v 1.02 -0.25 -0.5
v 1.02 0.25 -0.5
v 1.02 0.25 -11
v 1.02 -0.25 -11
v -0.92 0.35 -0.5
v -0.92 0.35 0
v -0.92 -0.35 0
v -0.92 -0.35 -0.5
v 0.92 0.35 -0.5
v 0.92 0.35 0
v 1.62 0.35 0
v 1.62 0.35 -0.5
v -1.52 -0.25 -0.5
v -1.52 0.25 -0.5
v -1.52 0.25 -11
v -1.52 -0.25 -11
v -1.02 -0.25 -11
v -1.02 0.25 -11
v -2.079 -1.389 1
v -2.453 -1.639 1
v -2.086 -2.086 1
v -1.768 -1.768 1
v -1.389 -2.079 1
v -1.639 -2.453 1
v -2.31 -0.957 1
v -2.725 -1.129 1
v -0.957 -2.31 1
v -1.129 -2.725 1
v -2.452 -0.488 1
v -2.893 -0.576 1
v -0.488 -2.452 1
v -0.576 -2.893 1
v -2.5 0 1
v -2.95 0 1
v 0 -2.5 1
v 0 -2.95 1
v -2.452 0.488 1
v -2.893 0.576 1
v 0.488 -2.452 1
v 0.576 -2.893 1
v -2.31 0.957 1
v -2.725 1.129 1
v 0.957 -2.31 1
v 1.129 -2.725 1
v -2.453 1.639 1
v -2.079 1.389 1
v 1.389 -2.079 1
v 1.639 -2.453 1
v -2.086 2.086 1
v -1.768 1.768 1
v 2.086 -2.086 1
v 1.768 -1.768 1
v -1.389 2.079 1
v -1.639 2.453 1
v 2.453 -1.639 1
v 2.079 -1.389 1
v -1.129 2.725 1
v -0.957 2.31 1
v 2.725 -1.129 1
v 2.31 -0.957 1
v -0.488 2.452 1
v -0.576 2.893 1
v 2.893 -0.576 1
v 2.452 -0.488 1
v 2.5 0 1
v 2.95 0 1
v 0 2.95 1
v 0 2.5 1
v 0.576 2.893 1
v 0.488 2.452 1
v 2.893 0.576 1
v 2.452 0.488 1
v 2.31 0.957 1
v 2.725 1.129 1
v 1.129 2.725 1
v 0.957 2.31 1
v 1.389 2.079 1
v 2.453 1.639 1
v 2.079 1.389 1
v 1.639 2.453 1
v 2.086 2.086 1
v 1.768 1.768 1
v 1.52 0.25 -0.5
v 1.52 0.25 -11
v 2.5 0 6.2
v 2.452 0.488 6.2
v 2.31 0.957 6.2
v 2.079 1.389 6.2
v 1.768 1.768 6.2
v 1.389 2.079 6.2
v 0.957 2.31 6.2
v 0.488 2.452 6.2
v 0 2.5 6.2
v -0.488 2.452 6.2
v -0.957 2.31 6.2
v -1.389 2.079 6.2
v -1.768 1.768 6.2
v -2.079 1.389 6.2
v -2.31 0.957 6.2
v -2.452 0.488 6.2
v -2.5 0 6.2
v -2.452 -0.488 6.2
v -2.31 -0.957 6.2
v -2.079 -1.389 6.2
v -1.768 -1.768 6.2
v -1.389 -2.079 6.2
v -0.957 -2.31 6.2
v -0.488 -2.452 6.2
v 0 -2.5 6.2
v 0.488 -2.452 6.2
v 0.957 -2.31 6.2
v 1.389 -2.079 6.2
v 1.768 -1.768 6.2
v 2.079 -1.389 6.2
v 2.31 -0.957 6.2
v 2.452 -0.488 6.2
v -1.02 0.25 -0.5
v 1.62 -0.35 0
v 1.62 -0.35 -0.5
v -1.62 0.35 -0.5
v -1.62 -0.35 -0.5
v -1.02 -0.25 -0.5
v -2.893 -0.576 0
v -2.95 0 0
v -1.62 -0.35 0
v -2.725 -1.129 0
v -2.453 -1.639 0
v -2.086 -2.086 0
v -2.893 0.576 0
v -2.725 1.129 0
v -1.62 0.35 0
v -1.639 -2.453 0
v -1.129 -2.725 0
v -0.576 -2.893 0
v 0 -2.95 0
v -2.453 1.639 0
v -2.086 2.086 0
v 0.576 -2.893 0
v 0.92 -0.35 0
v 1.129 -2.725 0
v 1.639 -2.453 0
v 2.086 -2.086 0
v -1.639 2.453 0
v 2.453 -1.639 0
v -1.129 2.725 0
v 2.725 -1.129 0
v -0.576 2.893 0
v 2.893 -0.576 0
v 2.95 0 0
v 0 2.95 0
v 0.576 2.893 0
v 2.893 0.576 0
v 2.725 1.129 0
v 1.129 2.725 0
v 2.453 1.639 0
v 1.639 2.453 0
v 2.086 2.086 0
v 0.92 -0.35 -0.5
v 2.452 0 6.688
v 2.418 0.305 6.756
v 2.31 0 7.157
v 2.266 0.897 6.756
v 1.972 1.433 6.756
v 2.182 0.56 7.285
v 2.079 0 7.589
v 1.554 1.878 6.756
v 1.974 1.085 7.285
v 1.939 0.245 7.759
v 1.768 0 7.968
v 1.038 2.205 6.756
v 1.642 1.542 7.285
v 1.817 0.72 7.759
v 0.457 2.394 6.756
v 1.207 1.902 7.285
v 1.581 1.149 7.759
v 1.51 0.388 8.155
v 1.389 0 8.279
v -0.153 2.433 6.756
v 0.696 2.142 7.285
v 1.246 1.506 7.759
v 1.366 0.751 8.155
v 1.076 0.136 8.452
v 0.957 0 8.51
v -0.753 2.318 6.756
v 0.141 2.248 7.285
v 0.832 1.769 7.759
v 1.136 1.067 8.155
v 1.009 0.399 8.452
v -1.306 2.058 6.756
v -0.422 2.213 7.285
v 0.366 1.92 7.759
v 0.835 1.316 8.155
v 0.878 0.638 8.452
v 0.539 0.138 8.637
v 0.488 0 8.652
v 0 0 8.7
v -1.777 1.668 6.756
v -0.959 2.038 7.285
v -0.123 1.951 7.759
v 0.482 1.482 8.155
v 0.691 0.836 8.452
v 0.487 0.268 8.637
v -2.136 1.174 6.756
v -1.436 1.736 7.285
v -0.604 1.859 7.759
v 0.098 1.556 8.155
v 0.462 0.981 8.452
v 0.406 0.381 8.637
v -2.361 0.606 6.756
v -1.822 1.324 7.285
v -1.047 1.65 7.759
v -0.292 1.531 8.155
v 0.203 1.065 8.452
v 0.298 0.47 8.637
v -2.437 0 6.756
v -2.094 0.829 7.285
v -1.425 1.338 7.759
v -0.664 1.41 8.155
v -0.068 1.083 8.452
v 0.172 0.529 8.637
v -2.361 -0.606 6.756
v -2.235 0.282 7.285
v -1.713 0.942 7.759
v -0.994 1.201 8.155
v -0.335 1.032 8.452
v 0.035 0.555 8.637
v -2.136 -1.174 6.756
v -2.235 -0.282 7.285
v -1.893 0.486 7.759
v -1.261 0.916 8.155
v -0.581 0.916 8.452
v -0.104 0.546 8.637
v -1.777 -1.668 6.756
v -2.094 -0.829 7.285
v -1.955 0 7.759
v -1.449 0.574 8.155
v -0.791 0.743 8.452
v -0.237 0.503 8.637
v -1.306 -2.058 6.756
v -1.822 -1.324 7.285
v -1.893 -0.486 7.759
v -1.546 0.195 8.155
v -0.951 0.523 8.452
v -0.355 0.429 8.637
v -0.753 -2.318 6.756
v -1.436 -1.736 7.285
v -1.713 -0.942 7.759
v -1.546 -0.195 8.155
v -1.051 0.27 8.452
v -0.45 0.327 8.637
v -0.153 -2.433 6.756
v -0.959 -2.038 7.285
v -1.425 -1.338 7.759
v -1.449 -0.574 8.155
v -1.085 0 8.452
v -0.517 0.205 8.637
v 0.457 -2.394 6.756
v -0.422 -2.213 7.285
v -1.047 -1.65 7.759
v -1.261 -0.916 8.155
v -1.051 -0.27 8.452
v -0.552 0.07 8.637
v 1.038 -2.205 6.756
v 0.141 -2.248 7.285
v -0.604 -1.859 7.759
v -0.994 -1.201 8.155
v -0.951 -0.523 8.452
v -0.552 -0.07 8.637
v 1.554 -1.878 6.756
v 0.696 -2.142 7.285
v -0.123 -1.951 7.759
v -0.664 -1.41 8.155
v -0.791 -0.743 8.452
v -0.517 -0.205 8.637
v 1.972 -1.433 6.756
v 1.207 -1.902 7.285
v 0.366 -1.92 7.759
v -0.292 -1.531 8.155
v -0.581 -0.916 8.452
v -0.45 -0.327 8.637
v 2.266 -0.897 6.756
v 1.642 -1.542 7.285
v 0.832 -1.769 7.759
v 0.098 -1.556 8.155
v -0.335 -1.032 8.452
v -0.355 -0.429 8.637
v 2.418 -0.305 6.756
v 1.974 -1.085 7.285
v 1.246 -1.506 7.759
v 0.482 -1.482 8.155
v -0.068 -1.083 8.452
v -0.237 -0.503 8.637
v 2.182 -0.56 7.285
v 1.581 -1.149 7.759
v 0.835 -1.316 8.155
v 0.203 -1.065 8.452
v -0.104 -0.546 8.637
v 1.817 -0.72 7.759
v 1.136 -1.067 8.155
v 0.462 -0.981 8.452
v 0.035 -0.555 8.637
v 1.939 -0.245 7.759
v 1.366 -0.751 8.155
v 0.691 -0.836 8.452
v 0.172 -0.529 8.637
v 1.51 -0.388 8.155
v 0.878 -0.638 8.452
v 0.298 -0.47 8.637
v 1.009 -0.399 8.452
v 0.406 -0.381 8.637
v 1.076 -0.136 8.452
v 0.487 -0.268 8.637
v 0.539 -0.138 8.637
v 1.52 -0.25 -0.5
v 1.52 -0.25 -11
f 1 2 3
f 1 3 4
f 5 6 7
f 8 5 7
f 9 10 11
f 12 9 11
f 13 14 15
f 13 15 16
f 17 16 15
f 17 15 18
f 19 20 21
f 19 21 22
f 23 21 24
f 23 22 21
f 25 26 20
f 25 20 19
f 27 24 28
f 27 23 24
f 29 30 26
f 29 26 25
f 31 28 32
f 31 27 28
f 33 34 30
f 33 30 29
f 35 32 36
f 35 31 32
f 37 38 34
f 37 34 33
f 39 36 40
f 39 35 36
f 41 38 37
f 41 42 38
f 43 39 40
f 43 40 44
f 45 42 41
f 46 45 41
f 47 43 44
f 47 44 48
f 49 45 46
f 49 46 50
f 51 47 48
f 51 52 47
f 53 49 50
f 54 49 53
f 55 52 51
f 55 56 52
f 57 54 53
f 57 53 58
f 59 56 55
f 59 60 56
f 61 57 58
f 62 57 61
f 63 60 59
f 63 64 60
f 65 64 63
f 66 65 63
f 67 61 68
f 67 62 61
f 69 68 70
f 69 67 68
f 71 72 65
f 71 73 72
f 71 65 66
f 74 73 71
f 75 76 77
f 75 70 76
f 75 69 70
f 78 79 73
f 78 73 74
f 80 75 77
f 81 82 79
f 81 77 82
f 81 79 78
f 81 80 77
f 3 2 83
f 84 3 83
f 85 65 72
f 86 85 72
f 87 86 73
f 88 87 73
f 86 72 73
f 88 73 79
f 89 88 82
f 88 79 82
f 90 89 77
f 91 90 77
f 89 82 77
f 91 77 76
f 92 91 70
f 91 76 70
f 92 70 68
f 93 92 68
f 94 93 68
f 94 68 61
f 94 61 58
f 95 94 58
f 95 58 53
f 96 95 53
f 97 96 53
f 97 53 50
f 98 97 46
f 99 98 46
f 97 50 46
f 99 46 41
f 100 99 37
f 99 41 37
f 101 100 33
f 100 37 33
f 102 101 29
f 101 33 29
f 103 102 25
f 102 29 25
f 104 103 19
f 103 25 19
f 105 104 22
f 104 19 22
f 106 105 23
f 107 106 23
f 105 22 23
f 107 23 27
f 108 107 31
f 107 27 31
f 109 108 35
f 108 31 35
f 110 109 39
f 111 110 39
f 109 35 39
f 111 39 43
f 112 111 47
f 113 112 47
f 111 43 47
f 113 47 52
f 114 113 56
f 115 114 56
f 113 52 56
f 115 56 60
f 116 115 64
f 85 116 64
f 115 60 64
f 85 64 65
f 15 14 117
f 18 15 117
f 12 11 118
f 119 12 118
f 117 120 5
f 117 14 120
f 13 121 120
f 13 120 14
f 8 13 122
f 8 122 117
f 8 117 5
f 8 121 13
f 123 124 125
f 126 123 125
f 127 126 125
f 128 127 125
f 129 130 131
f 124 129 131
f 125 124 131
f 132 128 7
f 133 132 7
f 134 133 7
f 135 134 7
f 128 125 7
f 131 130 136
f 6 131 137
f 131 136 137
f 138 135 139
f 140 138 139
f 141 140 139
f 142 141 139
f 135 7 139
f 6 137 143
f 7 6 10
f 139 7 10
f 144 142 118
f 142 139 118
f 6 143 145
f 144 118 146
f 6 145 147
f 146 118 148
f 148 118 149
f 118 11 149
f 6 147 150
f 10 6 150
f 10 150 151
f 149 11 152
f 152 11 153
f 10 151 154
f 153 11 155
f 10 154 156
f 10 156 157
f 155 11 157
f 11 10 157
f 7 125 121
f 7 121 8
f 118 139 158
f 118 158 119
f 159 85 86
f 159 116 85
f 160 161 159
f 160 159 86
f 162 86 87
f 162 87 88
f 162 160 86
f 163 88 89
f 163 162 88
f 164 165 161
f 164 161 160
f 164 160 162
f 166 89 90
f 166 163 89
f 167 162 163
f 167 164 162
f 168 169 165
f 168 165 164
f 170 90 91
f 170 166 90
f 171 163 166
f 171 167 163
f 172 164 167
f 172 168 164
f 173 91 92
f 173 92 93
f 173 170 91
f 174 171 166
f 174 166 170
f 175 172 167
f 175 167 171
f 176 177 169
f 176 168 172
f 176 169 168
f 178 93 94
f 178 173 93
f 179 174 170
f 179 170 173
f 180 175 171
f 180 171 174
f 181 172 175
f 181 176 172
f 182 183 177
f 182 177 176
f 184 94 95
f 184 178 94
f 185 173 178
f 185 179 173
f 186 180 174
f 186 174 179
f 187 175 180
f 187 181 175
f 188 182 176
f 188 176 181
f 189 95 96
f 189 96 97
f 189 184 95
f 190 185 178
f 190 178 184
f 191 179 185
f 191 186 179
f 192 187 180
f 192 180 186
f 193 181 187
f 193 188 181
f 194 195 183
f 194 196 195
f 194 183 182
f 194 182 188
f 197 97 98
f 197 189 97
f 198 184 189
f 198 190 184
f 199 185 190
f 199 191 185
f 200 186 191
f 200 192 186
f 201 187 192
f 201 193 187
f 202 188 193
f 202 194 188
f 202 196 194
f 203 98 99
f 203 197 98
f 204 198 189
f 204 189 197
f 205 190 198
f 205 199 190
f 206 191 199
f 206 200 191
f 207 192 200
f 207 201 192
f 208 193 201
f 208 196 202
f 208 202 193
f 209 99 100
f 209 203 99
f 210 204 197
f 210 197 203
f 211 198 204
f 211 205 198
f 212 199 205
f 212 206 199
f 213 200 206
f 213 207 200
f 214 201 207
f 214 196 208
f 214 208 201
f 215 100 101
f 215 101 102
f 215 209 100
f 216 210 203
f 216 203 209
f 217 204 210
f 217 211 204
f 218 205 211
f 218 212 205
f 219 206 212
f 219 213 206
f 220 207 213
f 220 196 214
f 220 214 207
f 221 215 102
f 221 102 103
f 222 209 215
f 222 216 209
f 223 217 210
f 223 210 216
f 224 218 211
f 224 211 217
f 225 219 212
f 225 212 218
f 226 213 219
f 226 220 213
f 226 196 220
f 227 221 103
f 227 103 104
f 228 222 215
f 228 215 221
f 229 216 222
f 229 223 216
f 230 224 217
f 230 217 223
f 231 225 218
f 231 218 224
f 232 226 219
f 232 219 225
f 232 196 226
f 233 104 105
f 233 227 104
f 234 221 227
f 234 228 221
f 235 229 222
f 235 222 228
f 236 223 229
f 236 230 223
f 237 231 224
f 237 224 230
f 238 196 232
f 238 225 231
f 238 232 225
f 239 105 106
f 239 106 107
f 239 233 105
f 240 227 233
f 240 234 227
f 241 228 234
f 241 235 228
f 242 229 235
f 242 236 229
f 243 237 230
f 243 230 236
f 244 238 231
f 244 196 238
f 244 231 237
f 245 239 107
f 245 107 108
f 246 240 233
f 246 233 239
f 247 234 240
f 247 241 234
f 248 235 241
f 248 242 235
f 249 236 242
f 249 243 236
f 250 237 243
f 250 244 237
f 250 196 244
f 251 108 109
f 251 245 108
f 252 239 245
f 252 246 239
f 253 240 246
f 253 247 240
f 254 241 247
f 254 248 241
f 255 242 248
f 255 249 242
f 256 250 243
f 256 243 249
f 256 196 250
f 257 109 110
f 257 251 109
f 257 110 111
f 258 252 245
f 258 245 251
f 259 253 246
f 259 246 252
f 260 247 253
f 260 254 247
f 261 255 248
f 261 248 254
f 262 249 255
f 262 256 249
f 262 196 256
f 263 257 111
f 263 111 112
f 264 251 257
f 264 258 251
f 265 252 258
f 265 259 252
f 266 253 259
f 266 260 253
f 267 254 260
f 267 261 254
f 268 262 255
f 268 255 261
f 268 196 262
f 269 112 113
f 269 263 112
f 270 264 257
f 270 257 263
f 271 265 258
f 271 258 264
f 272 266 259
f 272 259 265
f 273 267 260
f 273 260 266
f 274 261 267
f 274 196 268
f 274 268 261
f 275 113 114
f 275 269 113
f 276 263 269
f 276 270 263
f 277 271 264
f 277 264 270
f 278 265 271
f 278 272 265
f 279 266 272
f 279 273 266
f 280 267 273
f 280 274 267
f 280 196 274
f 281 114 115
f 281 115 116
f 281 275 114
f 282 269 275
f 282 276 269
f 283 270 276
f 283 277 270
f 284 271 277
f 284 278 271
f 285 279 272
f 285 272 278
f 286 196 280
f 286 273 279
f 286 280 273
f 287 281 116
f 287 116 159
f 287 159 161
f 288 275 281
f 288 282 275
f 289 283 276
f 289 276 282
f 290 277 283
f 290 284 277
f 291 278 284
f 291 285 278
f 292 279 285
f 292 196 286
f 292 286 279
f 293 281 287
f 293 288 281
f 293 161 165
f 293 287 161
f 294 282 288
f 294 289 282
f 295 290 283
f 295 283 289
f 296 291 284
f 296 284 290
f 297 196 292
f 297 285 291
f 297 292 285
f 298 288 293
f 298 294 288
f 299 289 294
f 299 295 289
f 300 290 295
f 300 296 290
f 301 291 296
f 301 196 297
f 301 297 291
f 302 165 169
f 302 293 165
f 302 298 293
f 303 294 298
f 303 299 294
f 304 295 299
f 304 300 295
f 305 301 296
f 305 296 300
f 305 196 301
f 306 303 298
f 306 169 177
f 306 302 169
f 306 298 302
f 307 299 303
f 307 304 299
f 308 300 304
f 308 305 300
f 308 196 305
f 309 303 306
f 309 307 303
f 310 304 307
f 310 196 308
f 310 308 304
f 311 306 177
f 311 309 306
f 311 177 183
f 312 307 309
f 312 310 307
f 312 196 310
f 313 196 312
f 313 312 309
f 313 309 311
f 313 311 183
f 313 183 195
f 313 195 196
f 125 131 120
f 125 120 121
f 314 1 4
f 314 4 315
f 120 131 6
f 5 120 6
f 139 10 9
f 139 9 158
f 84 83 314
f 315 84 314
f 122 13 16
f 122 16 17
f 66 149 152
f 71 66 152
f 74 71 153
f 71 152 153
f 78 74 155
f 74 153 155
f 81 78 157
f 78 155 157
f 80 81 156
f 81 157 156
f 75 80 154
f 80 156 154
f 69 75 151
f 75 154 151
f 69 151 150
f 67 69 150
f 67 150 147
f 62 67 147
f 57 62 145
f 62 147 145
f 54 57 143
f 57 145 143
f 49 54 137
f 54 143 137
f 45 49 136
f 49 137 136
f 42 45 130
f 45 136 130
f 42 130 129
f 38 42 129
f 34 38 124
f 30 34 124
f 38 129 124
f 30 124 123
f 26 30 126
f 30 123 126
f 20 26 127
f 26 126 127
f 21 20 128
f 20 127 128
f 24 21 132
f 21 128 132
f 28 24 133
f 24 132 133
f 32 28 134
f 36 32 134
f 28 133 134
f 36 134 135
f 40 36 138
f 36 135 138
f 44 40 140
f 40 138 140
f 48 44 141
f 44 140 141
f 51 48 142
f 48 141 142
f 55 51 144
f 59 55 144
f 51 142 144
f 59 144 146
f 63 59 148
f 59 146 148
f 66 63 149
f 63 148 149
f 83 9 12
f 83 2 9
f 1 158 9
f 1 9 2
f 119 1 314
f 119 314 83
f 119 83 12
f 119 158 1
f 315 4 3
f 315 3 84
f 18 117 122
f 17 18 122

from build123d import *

# Parameters (mm, degrees)
SKETCH_R            = 2.95
PAD_DEPTH           = 1
SKETCH001_R         = 2.5
PAD001_DEPTH        = 7.7
FILLET_R            = 2.5
SKETCH002_W         = 0.7
SKETCH002_H         = 0.7
PAD002_DEPTH        = 0.5
SKETCH003_W         = 0.5
SKETCH003_H         = 0.5
PAD003_DEPTH        = 10.5
LINEARPATTERN_COUNT = 2
LINEARPATTERN_PITCH = 2.54


with BuildPart() as part:
    # Sketch → Pad (new body)
    with BuildSketch(Plane.XY):
        Circle(SKETCH_R)
    extrude(amount=PAD_DEPTH)

    # Sketch001 (on Face3 of Pad) → Pad001 (join)
    with BuildSketch(Plane.XY.offset(1)):
        Circle(SKETCH001_R)
    extrude(amount=PAD001_DEPTH)

    # Fillet
    fillet_edges = [part.edges().sort_by_distance(p)[0] for p in [
        (-2.5, 0, 8.7),
    ]]
    fillet(fillet_edges, radius=FILLET_R)

    # Sketch002 (on Face5 of Fillet) → Pad002 (join)
    with BuildSketch(Plane(origin=(0, 0, 0), x_dir=(1, 0, 0), z_dir=(0, 0, -1))):
        with Locations((-1.27, 0)):
            Rectangle(SKETCH002_W, SKETCH002_H)
    pad002 = extrude(amount=PAD002_DEPTH)

    # Sketch003 (on Face10 of Pad002) → Pad003 (join)
    with BuildSketch(Plane(origin=(0, 0, -0.5), x_dir=(1, 0, 0), z_dir=(0, 0, -1))):
        with Locations((-1.27, 0)):
            Rectangle(SKETCH003_W, SKETCH003_H)
    pad003 = extrude(amount=PAD003_DEPTH)

    # LinearPattern: Pad002, Pad003 ×2
    with Locations(*[(i * LINEARPATTERN_PITCH, 0, 0) for i in range(1, LINEARPATTERN_COUNT)]):
        add(pad002)
        add(pad003)


solid = part.part
